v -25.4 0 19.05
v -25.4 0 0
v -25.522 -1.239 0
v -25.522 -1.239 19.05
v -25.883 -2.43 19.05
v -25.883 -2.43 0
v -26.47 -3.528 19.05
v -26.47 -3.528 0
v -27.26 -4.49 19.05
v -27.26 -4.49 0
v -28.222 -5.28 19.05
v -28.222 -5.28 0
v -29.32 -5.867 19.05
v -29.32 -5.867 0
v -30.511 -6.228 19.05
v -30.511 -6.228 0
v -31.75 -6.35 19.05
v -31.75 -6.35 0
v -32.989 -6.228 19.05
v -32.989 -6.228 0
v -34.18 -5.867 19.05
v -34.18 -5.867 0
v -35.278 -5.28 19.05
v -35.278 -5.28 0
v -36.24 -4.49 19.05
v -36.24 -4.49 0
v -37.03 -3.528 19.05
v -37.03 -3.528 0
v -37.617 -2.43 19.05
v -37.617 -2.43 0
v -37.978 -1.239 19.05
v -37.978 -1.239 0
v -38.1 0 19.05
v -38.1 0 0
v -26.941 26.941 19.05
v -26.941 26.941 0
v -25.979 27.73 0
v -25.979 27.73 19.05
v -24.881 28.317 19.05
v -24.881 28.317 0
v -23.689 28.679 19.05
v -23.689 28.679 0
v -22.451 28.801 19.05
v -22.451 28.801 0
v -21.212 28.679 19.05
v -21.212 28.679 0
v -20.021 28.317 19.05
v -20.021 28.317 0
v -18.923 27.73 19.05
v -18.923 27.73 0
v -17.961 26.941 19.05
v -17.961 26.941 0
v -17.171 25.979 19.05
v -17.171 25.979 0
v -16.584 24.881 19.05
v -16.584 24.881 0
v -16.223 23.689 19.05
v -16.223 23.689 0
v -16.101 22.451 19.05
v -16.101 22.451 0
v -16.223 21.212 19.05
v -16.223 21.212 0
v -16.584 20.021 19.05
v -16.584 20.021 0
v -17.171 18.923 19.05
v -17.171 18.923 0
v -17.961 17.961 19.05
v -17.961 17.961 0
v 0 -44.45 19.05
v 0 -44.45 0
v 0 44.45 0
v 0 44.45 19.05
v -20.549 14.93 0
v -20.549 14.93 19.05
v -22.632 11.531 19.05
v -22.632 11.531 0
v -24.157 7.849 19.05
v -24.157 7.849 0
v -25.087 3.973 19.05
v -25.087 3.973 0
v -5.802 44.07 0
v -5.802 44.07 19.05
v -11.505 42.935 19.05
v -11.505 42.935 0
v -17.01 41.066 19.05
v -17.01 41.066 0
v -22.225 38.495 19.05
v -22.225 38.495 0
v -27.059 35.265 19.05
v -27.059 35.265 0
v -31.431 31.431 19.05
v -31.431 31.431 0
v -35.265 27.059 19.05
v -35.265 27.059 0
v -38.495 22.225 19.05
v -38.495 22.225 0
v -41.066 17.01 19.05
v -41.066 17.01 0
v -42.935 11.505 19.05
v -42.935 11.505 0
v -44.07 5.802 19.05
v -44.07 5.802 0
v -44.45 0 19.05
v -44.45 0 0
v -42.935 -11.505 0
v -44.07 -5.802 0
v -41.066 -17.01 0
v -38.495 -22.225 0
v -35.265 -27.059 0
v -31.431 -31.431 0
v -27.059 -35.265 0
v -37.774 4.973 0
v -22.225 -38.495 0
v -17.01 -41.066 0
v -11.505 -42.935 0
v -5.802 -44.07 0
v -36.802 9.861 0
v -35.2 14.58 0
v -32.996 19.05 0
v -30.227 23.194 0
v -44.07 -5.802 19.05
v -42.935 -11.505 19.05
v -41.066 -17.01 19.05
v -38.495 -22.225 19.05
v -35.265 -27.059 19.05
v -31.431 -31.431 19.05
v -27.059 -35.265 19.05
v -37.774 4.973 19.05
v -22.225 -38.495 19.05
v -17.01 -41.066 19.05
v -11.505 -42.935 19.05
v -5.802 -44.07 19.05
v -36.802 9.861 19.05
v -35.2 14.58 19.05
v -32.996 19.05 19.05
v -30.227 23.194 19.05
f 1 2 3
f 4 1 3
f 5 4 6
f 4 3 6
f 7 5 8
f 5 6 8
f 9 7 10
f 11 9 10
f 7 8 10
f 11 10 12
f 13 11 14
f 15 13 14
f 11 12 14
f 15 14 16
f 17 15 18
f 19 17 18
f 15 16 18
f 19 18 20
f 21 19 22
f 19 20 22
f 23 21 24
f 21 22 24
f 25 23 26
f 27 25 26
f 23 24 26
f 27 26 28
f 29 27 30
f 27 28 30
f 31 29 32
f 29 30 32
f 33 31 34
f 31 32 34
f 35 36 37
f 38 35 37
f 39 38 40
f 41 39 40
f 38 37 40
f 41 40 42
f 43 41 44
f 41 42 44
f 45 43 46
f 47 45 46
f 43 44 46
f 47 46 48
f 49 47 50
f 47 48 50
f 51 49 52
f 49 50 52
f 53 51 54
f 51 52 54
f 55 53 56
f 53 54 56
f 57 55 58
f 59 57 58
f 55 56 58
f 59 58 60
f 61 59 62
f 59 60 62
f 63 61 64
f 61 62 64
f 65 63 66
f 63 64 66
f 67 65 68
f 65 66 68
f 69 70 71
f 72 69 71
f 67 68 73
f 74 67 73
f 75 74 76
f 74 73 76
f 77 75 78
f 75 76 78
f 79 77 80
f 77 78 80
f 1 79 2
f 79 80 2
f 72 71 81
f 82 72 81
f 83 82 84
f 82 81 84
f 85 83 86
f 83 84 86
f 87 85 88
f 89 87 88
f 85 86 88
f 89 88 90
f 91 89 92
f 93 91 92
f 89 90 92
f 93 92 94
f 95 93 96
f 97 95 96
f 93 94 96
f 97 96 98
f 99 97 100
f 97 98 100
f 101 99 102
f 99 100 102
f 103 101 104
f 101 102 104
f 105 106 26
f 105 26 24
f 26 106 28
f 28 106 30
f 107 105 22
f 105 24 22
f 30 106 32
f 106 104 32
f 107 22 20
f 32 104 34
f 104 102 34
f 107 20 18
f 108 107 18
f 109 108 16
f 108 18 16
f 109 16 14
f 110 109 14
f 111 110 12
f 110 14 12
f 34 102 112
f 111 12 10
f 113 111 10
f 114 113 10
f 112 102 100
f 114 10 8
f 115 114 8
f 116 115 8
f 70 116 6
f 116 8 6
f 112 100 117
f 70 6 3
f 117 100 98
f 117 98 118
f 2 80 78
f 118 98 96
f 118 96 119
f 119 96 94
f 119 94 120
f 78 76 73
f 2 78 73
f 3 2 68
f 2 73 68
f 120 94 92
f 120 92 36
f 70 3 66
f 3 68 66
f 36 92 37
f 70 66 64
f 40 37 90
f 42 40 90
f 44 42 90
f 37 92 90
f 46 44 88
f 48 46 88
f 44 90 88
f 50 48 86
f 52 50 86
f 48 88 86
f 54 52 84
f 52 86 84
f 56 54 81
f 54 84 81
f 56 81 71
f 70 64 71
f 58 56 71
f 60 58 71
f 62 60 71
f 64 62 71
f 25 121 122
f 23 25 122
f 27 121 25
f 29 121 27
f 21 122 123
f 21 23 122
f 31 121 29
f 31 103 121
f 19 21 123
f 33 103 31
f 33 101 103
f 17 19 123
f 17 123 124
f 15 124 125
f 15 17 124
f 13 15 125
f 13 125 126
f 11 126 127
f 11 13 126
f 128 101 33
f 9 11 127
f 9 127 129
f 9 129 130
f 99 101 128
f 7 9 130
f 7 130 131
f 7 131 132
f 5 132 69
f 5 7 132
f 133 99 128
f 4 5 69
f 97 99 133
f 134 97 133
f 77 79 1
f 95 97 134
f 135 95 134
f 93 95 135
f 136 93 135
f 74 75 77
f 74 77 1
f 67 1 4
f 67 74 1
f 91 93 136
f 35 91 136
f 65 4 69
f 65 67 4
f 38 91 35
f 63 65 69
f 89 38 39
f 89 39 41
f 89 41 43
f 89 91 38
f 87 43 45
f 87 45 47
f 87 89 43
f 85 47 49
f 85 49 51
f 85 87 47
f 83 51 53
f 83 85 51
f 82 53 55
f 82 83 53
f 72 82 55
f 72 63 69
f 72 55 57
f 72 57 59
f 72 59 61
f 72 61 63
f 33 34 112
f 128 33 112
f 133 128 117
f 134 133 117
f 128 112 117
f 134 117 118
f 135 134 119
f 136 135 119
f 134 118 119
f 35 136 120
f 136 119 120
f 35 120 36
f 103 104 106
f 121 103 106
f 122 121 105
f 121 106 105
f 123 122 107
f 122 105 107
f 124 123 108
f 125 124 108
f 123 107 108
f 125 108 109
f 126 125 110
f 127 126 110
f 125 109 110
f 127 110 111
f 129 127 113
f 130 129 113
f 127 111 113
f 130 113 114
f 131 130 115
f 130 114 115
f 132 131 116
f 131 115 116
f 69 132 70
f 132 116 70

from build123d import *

# Parameters (mm, degrees)
F1_DEPTH = 19.05


with BuildPart() as f1:
    # F0 (on Top) → F1 (new body)
    with BuildSketch(Plane.XY):
        with BuildLine():
            Line((0, 38.1), (0, 44.45))
            ThreePointArc((0, 44.45), (-31.430896, 31.430896), (-44.45, 0))
            ThreePointArc((-44.45, 0), (-31.430896, -31.430896), (0, -44.45))
            Line((0, -44.45), (0, -38.1))
            Line((0, -38.1), (0, -25.4))
            Line((0, -25.4), (0, 25.4))
            Line((0, 25.4), (0, 38.1))
        make_face()
        with BuildLine():
            ThreePointArc((-25.4, 0), (-31.75, -6.35), (-38.1, 0))
            ThreePointArc((-38.1, 0), (-35.19981, 14.580239), (-26.940768, 26.940768))
            ThreePointArc((-26.940768, 26.940768), (-17.960512, 26.940768), (-17.960512, 17.960512))
            ThreePointArc((-17.960512, 17.960512), (-23.46654, 9.720159), (-25.4, 0))
        make_face(mode=Mode.SUBTRACT)
    extrude(amount=F1_DEPTH)


solid = f1.part
